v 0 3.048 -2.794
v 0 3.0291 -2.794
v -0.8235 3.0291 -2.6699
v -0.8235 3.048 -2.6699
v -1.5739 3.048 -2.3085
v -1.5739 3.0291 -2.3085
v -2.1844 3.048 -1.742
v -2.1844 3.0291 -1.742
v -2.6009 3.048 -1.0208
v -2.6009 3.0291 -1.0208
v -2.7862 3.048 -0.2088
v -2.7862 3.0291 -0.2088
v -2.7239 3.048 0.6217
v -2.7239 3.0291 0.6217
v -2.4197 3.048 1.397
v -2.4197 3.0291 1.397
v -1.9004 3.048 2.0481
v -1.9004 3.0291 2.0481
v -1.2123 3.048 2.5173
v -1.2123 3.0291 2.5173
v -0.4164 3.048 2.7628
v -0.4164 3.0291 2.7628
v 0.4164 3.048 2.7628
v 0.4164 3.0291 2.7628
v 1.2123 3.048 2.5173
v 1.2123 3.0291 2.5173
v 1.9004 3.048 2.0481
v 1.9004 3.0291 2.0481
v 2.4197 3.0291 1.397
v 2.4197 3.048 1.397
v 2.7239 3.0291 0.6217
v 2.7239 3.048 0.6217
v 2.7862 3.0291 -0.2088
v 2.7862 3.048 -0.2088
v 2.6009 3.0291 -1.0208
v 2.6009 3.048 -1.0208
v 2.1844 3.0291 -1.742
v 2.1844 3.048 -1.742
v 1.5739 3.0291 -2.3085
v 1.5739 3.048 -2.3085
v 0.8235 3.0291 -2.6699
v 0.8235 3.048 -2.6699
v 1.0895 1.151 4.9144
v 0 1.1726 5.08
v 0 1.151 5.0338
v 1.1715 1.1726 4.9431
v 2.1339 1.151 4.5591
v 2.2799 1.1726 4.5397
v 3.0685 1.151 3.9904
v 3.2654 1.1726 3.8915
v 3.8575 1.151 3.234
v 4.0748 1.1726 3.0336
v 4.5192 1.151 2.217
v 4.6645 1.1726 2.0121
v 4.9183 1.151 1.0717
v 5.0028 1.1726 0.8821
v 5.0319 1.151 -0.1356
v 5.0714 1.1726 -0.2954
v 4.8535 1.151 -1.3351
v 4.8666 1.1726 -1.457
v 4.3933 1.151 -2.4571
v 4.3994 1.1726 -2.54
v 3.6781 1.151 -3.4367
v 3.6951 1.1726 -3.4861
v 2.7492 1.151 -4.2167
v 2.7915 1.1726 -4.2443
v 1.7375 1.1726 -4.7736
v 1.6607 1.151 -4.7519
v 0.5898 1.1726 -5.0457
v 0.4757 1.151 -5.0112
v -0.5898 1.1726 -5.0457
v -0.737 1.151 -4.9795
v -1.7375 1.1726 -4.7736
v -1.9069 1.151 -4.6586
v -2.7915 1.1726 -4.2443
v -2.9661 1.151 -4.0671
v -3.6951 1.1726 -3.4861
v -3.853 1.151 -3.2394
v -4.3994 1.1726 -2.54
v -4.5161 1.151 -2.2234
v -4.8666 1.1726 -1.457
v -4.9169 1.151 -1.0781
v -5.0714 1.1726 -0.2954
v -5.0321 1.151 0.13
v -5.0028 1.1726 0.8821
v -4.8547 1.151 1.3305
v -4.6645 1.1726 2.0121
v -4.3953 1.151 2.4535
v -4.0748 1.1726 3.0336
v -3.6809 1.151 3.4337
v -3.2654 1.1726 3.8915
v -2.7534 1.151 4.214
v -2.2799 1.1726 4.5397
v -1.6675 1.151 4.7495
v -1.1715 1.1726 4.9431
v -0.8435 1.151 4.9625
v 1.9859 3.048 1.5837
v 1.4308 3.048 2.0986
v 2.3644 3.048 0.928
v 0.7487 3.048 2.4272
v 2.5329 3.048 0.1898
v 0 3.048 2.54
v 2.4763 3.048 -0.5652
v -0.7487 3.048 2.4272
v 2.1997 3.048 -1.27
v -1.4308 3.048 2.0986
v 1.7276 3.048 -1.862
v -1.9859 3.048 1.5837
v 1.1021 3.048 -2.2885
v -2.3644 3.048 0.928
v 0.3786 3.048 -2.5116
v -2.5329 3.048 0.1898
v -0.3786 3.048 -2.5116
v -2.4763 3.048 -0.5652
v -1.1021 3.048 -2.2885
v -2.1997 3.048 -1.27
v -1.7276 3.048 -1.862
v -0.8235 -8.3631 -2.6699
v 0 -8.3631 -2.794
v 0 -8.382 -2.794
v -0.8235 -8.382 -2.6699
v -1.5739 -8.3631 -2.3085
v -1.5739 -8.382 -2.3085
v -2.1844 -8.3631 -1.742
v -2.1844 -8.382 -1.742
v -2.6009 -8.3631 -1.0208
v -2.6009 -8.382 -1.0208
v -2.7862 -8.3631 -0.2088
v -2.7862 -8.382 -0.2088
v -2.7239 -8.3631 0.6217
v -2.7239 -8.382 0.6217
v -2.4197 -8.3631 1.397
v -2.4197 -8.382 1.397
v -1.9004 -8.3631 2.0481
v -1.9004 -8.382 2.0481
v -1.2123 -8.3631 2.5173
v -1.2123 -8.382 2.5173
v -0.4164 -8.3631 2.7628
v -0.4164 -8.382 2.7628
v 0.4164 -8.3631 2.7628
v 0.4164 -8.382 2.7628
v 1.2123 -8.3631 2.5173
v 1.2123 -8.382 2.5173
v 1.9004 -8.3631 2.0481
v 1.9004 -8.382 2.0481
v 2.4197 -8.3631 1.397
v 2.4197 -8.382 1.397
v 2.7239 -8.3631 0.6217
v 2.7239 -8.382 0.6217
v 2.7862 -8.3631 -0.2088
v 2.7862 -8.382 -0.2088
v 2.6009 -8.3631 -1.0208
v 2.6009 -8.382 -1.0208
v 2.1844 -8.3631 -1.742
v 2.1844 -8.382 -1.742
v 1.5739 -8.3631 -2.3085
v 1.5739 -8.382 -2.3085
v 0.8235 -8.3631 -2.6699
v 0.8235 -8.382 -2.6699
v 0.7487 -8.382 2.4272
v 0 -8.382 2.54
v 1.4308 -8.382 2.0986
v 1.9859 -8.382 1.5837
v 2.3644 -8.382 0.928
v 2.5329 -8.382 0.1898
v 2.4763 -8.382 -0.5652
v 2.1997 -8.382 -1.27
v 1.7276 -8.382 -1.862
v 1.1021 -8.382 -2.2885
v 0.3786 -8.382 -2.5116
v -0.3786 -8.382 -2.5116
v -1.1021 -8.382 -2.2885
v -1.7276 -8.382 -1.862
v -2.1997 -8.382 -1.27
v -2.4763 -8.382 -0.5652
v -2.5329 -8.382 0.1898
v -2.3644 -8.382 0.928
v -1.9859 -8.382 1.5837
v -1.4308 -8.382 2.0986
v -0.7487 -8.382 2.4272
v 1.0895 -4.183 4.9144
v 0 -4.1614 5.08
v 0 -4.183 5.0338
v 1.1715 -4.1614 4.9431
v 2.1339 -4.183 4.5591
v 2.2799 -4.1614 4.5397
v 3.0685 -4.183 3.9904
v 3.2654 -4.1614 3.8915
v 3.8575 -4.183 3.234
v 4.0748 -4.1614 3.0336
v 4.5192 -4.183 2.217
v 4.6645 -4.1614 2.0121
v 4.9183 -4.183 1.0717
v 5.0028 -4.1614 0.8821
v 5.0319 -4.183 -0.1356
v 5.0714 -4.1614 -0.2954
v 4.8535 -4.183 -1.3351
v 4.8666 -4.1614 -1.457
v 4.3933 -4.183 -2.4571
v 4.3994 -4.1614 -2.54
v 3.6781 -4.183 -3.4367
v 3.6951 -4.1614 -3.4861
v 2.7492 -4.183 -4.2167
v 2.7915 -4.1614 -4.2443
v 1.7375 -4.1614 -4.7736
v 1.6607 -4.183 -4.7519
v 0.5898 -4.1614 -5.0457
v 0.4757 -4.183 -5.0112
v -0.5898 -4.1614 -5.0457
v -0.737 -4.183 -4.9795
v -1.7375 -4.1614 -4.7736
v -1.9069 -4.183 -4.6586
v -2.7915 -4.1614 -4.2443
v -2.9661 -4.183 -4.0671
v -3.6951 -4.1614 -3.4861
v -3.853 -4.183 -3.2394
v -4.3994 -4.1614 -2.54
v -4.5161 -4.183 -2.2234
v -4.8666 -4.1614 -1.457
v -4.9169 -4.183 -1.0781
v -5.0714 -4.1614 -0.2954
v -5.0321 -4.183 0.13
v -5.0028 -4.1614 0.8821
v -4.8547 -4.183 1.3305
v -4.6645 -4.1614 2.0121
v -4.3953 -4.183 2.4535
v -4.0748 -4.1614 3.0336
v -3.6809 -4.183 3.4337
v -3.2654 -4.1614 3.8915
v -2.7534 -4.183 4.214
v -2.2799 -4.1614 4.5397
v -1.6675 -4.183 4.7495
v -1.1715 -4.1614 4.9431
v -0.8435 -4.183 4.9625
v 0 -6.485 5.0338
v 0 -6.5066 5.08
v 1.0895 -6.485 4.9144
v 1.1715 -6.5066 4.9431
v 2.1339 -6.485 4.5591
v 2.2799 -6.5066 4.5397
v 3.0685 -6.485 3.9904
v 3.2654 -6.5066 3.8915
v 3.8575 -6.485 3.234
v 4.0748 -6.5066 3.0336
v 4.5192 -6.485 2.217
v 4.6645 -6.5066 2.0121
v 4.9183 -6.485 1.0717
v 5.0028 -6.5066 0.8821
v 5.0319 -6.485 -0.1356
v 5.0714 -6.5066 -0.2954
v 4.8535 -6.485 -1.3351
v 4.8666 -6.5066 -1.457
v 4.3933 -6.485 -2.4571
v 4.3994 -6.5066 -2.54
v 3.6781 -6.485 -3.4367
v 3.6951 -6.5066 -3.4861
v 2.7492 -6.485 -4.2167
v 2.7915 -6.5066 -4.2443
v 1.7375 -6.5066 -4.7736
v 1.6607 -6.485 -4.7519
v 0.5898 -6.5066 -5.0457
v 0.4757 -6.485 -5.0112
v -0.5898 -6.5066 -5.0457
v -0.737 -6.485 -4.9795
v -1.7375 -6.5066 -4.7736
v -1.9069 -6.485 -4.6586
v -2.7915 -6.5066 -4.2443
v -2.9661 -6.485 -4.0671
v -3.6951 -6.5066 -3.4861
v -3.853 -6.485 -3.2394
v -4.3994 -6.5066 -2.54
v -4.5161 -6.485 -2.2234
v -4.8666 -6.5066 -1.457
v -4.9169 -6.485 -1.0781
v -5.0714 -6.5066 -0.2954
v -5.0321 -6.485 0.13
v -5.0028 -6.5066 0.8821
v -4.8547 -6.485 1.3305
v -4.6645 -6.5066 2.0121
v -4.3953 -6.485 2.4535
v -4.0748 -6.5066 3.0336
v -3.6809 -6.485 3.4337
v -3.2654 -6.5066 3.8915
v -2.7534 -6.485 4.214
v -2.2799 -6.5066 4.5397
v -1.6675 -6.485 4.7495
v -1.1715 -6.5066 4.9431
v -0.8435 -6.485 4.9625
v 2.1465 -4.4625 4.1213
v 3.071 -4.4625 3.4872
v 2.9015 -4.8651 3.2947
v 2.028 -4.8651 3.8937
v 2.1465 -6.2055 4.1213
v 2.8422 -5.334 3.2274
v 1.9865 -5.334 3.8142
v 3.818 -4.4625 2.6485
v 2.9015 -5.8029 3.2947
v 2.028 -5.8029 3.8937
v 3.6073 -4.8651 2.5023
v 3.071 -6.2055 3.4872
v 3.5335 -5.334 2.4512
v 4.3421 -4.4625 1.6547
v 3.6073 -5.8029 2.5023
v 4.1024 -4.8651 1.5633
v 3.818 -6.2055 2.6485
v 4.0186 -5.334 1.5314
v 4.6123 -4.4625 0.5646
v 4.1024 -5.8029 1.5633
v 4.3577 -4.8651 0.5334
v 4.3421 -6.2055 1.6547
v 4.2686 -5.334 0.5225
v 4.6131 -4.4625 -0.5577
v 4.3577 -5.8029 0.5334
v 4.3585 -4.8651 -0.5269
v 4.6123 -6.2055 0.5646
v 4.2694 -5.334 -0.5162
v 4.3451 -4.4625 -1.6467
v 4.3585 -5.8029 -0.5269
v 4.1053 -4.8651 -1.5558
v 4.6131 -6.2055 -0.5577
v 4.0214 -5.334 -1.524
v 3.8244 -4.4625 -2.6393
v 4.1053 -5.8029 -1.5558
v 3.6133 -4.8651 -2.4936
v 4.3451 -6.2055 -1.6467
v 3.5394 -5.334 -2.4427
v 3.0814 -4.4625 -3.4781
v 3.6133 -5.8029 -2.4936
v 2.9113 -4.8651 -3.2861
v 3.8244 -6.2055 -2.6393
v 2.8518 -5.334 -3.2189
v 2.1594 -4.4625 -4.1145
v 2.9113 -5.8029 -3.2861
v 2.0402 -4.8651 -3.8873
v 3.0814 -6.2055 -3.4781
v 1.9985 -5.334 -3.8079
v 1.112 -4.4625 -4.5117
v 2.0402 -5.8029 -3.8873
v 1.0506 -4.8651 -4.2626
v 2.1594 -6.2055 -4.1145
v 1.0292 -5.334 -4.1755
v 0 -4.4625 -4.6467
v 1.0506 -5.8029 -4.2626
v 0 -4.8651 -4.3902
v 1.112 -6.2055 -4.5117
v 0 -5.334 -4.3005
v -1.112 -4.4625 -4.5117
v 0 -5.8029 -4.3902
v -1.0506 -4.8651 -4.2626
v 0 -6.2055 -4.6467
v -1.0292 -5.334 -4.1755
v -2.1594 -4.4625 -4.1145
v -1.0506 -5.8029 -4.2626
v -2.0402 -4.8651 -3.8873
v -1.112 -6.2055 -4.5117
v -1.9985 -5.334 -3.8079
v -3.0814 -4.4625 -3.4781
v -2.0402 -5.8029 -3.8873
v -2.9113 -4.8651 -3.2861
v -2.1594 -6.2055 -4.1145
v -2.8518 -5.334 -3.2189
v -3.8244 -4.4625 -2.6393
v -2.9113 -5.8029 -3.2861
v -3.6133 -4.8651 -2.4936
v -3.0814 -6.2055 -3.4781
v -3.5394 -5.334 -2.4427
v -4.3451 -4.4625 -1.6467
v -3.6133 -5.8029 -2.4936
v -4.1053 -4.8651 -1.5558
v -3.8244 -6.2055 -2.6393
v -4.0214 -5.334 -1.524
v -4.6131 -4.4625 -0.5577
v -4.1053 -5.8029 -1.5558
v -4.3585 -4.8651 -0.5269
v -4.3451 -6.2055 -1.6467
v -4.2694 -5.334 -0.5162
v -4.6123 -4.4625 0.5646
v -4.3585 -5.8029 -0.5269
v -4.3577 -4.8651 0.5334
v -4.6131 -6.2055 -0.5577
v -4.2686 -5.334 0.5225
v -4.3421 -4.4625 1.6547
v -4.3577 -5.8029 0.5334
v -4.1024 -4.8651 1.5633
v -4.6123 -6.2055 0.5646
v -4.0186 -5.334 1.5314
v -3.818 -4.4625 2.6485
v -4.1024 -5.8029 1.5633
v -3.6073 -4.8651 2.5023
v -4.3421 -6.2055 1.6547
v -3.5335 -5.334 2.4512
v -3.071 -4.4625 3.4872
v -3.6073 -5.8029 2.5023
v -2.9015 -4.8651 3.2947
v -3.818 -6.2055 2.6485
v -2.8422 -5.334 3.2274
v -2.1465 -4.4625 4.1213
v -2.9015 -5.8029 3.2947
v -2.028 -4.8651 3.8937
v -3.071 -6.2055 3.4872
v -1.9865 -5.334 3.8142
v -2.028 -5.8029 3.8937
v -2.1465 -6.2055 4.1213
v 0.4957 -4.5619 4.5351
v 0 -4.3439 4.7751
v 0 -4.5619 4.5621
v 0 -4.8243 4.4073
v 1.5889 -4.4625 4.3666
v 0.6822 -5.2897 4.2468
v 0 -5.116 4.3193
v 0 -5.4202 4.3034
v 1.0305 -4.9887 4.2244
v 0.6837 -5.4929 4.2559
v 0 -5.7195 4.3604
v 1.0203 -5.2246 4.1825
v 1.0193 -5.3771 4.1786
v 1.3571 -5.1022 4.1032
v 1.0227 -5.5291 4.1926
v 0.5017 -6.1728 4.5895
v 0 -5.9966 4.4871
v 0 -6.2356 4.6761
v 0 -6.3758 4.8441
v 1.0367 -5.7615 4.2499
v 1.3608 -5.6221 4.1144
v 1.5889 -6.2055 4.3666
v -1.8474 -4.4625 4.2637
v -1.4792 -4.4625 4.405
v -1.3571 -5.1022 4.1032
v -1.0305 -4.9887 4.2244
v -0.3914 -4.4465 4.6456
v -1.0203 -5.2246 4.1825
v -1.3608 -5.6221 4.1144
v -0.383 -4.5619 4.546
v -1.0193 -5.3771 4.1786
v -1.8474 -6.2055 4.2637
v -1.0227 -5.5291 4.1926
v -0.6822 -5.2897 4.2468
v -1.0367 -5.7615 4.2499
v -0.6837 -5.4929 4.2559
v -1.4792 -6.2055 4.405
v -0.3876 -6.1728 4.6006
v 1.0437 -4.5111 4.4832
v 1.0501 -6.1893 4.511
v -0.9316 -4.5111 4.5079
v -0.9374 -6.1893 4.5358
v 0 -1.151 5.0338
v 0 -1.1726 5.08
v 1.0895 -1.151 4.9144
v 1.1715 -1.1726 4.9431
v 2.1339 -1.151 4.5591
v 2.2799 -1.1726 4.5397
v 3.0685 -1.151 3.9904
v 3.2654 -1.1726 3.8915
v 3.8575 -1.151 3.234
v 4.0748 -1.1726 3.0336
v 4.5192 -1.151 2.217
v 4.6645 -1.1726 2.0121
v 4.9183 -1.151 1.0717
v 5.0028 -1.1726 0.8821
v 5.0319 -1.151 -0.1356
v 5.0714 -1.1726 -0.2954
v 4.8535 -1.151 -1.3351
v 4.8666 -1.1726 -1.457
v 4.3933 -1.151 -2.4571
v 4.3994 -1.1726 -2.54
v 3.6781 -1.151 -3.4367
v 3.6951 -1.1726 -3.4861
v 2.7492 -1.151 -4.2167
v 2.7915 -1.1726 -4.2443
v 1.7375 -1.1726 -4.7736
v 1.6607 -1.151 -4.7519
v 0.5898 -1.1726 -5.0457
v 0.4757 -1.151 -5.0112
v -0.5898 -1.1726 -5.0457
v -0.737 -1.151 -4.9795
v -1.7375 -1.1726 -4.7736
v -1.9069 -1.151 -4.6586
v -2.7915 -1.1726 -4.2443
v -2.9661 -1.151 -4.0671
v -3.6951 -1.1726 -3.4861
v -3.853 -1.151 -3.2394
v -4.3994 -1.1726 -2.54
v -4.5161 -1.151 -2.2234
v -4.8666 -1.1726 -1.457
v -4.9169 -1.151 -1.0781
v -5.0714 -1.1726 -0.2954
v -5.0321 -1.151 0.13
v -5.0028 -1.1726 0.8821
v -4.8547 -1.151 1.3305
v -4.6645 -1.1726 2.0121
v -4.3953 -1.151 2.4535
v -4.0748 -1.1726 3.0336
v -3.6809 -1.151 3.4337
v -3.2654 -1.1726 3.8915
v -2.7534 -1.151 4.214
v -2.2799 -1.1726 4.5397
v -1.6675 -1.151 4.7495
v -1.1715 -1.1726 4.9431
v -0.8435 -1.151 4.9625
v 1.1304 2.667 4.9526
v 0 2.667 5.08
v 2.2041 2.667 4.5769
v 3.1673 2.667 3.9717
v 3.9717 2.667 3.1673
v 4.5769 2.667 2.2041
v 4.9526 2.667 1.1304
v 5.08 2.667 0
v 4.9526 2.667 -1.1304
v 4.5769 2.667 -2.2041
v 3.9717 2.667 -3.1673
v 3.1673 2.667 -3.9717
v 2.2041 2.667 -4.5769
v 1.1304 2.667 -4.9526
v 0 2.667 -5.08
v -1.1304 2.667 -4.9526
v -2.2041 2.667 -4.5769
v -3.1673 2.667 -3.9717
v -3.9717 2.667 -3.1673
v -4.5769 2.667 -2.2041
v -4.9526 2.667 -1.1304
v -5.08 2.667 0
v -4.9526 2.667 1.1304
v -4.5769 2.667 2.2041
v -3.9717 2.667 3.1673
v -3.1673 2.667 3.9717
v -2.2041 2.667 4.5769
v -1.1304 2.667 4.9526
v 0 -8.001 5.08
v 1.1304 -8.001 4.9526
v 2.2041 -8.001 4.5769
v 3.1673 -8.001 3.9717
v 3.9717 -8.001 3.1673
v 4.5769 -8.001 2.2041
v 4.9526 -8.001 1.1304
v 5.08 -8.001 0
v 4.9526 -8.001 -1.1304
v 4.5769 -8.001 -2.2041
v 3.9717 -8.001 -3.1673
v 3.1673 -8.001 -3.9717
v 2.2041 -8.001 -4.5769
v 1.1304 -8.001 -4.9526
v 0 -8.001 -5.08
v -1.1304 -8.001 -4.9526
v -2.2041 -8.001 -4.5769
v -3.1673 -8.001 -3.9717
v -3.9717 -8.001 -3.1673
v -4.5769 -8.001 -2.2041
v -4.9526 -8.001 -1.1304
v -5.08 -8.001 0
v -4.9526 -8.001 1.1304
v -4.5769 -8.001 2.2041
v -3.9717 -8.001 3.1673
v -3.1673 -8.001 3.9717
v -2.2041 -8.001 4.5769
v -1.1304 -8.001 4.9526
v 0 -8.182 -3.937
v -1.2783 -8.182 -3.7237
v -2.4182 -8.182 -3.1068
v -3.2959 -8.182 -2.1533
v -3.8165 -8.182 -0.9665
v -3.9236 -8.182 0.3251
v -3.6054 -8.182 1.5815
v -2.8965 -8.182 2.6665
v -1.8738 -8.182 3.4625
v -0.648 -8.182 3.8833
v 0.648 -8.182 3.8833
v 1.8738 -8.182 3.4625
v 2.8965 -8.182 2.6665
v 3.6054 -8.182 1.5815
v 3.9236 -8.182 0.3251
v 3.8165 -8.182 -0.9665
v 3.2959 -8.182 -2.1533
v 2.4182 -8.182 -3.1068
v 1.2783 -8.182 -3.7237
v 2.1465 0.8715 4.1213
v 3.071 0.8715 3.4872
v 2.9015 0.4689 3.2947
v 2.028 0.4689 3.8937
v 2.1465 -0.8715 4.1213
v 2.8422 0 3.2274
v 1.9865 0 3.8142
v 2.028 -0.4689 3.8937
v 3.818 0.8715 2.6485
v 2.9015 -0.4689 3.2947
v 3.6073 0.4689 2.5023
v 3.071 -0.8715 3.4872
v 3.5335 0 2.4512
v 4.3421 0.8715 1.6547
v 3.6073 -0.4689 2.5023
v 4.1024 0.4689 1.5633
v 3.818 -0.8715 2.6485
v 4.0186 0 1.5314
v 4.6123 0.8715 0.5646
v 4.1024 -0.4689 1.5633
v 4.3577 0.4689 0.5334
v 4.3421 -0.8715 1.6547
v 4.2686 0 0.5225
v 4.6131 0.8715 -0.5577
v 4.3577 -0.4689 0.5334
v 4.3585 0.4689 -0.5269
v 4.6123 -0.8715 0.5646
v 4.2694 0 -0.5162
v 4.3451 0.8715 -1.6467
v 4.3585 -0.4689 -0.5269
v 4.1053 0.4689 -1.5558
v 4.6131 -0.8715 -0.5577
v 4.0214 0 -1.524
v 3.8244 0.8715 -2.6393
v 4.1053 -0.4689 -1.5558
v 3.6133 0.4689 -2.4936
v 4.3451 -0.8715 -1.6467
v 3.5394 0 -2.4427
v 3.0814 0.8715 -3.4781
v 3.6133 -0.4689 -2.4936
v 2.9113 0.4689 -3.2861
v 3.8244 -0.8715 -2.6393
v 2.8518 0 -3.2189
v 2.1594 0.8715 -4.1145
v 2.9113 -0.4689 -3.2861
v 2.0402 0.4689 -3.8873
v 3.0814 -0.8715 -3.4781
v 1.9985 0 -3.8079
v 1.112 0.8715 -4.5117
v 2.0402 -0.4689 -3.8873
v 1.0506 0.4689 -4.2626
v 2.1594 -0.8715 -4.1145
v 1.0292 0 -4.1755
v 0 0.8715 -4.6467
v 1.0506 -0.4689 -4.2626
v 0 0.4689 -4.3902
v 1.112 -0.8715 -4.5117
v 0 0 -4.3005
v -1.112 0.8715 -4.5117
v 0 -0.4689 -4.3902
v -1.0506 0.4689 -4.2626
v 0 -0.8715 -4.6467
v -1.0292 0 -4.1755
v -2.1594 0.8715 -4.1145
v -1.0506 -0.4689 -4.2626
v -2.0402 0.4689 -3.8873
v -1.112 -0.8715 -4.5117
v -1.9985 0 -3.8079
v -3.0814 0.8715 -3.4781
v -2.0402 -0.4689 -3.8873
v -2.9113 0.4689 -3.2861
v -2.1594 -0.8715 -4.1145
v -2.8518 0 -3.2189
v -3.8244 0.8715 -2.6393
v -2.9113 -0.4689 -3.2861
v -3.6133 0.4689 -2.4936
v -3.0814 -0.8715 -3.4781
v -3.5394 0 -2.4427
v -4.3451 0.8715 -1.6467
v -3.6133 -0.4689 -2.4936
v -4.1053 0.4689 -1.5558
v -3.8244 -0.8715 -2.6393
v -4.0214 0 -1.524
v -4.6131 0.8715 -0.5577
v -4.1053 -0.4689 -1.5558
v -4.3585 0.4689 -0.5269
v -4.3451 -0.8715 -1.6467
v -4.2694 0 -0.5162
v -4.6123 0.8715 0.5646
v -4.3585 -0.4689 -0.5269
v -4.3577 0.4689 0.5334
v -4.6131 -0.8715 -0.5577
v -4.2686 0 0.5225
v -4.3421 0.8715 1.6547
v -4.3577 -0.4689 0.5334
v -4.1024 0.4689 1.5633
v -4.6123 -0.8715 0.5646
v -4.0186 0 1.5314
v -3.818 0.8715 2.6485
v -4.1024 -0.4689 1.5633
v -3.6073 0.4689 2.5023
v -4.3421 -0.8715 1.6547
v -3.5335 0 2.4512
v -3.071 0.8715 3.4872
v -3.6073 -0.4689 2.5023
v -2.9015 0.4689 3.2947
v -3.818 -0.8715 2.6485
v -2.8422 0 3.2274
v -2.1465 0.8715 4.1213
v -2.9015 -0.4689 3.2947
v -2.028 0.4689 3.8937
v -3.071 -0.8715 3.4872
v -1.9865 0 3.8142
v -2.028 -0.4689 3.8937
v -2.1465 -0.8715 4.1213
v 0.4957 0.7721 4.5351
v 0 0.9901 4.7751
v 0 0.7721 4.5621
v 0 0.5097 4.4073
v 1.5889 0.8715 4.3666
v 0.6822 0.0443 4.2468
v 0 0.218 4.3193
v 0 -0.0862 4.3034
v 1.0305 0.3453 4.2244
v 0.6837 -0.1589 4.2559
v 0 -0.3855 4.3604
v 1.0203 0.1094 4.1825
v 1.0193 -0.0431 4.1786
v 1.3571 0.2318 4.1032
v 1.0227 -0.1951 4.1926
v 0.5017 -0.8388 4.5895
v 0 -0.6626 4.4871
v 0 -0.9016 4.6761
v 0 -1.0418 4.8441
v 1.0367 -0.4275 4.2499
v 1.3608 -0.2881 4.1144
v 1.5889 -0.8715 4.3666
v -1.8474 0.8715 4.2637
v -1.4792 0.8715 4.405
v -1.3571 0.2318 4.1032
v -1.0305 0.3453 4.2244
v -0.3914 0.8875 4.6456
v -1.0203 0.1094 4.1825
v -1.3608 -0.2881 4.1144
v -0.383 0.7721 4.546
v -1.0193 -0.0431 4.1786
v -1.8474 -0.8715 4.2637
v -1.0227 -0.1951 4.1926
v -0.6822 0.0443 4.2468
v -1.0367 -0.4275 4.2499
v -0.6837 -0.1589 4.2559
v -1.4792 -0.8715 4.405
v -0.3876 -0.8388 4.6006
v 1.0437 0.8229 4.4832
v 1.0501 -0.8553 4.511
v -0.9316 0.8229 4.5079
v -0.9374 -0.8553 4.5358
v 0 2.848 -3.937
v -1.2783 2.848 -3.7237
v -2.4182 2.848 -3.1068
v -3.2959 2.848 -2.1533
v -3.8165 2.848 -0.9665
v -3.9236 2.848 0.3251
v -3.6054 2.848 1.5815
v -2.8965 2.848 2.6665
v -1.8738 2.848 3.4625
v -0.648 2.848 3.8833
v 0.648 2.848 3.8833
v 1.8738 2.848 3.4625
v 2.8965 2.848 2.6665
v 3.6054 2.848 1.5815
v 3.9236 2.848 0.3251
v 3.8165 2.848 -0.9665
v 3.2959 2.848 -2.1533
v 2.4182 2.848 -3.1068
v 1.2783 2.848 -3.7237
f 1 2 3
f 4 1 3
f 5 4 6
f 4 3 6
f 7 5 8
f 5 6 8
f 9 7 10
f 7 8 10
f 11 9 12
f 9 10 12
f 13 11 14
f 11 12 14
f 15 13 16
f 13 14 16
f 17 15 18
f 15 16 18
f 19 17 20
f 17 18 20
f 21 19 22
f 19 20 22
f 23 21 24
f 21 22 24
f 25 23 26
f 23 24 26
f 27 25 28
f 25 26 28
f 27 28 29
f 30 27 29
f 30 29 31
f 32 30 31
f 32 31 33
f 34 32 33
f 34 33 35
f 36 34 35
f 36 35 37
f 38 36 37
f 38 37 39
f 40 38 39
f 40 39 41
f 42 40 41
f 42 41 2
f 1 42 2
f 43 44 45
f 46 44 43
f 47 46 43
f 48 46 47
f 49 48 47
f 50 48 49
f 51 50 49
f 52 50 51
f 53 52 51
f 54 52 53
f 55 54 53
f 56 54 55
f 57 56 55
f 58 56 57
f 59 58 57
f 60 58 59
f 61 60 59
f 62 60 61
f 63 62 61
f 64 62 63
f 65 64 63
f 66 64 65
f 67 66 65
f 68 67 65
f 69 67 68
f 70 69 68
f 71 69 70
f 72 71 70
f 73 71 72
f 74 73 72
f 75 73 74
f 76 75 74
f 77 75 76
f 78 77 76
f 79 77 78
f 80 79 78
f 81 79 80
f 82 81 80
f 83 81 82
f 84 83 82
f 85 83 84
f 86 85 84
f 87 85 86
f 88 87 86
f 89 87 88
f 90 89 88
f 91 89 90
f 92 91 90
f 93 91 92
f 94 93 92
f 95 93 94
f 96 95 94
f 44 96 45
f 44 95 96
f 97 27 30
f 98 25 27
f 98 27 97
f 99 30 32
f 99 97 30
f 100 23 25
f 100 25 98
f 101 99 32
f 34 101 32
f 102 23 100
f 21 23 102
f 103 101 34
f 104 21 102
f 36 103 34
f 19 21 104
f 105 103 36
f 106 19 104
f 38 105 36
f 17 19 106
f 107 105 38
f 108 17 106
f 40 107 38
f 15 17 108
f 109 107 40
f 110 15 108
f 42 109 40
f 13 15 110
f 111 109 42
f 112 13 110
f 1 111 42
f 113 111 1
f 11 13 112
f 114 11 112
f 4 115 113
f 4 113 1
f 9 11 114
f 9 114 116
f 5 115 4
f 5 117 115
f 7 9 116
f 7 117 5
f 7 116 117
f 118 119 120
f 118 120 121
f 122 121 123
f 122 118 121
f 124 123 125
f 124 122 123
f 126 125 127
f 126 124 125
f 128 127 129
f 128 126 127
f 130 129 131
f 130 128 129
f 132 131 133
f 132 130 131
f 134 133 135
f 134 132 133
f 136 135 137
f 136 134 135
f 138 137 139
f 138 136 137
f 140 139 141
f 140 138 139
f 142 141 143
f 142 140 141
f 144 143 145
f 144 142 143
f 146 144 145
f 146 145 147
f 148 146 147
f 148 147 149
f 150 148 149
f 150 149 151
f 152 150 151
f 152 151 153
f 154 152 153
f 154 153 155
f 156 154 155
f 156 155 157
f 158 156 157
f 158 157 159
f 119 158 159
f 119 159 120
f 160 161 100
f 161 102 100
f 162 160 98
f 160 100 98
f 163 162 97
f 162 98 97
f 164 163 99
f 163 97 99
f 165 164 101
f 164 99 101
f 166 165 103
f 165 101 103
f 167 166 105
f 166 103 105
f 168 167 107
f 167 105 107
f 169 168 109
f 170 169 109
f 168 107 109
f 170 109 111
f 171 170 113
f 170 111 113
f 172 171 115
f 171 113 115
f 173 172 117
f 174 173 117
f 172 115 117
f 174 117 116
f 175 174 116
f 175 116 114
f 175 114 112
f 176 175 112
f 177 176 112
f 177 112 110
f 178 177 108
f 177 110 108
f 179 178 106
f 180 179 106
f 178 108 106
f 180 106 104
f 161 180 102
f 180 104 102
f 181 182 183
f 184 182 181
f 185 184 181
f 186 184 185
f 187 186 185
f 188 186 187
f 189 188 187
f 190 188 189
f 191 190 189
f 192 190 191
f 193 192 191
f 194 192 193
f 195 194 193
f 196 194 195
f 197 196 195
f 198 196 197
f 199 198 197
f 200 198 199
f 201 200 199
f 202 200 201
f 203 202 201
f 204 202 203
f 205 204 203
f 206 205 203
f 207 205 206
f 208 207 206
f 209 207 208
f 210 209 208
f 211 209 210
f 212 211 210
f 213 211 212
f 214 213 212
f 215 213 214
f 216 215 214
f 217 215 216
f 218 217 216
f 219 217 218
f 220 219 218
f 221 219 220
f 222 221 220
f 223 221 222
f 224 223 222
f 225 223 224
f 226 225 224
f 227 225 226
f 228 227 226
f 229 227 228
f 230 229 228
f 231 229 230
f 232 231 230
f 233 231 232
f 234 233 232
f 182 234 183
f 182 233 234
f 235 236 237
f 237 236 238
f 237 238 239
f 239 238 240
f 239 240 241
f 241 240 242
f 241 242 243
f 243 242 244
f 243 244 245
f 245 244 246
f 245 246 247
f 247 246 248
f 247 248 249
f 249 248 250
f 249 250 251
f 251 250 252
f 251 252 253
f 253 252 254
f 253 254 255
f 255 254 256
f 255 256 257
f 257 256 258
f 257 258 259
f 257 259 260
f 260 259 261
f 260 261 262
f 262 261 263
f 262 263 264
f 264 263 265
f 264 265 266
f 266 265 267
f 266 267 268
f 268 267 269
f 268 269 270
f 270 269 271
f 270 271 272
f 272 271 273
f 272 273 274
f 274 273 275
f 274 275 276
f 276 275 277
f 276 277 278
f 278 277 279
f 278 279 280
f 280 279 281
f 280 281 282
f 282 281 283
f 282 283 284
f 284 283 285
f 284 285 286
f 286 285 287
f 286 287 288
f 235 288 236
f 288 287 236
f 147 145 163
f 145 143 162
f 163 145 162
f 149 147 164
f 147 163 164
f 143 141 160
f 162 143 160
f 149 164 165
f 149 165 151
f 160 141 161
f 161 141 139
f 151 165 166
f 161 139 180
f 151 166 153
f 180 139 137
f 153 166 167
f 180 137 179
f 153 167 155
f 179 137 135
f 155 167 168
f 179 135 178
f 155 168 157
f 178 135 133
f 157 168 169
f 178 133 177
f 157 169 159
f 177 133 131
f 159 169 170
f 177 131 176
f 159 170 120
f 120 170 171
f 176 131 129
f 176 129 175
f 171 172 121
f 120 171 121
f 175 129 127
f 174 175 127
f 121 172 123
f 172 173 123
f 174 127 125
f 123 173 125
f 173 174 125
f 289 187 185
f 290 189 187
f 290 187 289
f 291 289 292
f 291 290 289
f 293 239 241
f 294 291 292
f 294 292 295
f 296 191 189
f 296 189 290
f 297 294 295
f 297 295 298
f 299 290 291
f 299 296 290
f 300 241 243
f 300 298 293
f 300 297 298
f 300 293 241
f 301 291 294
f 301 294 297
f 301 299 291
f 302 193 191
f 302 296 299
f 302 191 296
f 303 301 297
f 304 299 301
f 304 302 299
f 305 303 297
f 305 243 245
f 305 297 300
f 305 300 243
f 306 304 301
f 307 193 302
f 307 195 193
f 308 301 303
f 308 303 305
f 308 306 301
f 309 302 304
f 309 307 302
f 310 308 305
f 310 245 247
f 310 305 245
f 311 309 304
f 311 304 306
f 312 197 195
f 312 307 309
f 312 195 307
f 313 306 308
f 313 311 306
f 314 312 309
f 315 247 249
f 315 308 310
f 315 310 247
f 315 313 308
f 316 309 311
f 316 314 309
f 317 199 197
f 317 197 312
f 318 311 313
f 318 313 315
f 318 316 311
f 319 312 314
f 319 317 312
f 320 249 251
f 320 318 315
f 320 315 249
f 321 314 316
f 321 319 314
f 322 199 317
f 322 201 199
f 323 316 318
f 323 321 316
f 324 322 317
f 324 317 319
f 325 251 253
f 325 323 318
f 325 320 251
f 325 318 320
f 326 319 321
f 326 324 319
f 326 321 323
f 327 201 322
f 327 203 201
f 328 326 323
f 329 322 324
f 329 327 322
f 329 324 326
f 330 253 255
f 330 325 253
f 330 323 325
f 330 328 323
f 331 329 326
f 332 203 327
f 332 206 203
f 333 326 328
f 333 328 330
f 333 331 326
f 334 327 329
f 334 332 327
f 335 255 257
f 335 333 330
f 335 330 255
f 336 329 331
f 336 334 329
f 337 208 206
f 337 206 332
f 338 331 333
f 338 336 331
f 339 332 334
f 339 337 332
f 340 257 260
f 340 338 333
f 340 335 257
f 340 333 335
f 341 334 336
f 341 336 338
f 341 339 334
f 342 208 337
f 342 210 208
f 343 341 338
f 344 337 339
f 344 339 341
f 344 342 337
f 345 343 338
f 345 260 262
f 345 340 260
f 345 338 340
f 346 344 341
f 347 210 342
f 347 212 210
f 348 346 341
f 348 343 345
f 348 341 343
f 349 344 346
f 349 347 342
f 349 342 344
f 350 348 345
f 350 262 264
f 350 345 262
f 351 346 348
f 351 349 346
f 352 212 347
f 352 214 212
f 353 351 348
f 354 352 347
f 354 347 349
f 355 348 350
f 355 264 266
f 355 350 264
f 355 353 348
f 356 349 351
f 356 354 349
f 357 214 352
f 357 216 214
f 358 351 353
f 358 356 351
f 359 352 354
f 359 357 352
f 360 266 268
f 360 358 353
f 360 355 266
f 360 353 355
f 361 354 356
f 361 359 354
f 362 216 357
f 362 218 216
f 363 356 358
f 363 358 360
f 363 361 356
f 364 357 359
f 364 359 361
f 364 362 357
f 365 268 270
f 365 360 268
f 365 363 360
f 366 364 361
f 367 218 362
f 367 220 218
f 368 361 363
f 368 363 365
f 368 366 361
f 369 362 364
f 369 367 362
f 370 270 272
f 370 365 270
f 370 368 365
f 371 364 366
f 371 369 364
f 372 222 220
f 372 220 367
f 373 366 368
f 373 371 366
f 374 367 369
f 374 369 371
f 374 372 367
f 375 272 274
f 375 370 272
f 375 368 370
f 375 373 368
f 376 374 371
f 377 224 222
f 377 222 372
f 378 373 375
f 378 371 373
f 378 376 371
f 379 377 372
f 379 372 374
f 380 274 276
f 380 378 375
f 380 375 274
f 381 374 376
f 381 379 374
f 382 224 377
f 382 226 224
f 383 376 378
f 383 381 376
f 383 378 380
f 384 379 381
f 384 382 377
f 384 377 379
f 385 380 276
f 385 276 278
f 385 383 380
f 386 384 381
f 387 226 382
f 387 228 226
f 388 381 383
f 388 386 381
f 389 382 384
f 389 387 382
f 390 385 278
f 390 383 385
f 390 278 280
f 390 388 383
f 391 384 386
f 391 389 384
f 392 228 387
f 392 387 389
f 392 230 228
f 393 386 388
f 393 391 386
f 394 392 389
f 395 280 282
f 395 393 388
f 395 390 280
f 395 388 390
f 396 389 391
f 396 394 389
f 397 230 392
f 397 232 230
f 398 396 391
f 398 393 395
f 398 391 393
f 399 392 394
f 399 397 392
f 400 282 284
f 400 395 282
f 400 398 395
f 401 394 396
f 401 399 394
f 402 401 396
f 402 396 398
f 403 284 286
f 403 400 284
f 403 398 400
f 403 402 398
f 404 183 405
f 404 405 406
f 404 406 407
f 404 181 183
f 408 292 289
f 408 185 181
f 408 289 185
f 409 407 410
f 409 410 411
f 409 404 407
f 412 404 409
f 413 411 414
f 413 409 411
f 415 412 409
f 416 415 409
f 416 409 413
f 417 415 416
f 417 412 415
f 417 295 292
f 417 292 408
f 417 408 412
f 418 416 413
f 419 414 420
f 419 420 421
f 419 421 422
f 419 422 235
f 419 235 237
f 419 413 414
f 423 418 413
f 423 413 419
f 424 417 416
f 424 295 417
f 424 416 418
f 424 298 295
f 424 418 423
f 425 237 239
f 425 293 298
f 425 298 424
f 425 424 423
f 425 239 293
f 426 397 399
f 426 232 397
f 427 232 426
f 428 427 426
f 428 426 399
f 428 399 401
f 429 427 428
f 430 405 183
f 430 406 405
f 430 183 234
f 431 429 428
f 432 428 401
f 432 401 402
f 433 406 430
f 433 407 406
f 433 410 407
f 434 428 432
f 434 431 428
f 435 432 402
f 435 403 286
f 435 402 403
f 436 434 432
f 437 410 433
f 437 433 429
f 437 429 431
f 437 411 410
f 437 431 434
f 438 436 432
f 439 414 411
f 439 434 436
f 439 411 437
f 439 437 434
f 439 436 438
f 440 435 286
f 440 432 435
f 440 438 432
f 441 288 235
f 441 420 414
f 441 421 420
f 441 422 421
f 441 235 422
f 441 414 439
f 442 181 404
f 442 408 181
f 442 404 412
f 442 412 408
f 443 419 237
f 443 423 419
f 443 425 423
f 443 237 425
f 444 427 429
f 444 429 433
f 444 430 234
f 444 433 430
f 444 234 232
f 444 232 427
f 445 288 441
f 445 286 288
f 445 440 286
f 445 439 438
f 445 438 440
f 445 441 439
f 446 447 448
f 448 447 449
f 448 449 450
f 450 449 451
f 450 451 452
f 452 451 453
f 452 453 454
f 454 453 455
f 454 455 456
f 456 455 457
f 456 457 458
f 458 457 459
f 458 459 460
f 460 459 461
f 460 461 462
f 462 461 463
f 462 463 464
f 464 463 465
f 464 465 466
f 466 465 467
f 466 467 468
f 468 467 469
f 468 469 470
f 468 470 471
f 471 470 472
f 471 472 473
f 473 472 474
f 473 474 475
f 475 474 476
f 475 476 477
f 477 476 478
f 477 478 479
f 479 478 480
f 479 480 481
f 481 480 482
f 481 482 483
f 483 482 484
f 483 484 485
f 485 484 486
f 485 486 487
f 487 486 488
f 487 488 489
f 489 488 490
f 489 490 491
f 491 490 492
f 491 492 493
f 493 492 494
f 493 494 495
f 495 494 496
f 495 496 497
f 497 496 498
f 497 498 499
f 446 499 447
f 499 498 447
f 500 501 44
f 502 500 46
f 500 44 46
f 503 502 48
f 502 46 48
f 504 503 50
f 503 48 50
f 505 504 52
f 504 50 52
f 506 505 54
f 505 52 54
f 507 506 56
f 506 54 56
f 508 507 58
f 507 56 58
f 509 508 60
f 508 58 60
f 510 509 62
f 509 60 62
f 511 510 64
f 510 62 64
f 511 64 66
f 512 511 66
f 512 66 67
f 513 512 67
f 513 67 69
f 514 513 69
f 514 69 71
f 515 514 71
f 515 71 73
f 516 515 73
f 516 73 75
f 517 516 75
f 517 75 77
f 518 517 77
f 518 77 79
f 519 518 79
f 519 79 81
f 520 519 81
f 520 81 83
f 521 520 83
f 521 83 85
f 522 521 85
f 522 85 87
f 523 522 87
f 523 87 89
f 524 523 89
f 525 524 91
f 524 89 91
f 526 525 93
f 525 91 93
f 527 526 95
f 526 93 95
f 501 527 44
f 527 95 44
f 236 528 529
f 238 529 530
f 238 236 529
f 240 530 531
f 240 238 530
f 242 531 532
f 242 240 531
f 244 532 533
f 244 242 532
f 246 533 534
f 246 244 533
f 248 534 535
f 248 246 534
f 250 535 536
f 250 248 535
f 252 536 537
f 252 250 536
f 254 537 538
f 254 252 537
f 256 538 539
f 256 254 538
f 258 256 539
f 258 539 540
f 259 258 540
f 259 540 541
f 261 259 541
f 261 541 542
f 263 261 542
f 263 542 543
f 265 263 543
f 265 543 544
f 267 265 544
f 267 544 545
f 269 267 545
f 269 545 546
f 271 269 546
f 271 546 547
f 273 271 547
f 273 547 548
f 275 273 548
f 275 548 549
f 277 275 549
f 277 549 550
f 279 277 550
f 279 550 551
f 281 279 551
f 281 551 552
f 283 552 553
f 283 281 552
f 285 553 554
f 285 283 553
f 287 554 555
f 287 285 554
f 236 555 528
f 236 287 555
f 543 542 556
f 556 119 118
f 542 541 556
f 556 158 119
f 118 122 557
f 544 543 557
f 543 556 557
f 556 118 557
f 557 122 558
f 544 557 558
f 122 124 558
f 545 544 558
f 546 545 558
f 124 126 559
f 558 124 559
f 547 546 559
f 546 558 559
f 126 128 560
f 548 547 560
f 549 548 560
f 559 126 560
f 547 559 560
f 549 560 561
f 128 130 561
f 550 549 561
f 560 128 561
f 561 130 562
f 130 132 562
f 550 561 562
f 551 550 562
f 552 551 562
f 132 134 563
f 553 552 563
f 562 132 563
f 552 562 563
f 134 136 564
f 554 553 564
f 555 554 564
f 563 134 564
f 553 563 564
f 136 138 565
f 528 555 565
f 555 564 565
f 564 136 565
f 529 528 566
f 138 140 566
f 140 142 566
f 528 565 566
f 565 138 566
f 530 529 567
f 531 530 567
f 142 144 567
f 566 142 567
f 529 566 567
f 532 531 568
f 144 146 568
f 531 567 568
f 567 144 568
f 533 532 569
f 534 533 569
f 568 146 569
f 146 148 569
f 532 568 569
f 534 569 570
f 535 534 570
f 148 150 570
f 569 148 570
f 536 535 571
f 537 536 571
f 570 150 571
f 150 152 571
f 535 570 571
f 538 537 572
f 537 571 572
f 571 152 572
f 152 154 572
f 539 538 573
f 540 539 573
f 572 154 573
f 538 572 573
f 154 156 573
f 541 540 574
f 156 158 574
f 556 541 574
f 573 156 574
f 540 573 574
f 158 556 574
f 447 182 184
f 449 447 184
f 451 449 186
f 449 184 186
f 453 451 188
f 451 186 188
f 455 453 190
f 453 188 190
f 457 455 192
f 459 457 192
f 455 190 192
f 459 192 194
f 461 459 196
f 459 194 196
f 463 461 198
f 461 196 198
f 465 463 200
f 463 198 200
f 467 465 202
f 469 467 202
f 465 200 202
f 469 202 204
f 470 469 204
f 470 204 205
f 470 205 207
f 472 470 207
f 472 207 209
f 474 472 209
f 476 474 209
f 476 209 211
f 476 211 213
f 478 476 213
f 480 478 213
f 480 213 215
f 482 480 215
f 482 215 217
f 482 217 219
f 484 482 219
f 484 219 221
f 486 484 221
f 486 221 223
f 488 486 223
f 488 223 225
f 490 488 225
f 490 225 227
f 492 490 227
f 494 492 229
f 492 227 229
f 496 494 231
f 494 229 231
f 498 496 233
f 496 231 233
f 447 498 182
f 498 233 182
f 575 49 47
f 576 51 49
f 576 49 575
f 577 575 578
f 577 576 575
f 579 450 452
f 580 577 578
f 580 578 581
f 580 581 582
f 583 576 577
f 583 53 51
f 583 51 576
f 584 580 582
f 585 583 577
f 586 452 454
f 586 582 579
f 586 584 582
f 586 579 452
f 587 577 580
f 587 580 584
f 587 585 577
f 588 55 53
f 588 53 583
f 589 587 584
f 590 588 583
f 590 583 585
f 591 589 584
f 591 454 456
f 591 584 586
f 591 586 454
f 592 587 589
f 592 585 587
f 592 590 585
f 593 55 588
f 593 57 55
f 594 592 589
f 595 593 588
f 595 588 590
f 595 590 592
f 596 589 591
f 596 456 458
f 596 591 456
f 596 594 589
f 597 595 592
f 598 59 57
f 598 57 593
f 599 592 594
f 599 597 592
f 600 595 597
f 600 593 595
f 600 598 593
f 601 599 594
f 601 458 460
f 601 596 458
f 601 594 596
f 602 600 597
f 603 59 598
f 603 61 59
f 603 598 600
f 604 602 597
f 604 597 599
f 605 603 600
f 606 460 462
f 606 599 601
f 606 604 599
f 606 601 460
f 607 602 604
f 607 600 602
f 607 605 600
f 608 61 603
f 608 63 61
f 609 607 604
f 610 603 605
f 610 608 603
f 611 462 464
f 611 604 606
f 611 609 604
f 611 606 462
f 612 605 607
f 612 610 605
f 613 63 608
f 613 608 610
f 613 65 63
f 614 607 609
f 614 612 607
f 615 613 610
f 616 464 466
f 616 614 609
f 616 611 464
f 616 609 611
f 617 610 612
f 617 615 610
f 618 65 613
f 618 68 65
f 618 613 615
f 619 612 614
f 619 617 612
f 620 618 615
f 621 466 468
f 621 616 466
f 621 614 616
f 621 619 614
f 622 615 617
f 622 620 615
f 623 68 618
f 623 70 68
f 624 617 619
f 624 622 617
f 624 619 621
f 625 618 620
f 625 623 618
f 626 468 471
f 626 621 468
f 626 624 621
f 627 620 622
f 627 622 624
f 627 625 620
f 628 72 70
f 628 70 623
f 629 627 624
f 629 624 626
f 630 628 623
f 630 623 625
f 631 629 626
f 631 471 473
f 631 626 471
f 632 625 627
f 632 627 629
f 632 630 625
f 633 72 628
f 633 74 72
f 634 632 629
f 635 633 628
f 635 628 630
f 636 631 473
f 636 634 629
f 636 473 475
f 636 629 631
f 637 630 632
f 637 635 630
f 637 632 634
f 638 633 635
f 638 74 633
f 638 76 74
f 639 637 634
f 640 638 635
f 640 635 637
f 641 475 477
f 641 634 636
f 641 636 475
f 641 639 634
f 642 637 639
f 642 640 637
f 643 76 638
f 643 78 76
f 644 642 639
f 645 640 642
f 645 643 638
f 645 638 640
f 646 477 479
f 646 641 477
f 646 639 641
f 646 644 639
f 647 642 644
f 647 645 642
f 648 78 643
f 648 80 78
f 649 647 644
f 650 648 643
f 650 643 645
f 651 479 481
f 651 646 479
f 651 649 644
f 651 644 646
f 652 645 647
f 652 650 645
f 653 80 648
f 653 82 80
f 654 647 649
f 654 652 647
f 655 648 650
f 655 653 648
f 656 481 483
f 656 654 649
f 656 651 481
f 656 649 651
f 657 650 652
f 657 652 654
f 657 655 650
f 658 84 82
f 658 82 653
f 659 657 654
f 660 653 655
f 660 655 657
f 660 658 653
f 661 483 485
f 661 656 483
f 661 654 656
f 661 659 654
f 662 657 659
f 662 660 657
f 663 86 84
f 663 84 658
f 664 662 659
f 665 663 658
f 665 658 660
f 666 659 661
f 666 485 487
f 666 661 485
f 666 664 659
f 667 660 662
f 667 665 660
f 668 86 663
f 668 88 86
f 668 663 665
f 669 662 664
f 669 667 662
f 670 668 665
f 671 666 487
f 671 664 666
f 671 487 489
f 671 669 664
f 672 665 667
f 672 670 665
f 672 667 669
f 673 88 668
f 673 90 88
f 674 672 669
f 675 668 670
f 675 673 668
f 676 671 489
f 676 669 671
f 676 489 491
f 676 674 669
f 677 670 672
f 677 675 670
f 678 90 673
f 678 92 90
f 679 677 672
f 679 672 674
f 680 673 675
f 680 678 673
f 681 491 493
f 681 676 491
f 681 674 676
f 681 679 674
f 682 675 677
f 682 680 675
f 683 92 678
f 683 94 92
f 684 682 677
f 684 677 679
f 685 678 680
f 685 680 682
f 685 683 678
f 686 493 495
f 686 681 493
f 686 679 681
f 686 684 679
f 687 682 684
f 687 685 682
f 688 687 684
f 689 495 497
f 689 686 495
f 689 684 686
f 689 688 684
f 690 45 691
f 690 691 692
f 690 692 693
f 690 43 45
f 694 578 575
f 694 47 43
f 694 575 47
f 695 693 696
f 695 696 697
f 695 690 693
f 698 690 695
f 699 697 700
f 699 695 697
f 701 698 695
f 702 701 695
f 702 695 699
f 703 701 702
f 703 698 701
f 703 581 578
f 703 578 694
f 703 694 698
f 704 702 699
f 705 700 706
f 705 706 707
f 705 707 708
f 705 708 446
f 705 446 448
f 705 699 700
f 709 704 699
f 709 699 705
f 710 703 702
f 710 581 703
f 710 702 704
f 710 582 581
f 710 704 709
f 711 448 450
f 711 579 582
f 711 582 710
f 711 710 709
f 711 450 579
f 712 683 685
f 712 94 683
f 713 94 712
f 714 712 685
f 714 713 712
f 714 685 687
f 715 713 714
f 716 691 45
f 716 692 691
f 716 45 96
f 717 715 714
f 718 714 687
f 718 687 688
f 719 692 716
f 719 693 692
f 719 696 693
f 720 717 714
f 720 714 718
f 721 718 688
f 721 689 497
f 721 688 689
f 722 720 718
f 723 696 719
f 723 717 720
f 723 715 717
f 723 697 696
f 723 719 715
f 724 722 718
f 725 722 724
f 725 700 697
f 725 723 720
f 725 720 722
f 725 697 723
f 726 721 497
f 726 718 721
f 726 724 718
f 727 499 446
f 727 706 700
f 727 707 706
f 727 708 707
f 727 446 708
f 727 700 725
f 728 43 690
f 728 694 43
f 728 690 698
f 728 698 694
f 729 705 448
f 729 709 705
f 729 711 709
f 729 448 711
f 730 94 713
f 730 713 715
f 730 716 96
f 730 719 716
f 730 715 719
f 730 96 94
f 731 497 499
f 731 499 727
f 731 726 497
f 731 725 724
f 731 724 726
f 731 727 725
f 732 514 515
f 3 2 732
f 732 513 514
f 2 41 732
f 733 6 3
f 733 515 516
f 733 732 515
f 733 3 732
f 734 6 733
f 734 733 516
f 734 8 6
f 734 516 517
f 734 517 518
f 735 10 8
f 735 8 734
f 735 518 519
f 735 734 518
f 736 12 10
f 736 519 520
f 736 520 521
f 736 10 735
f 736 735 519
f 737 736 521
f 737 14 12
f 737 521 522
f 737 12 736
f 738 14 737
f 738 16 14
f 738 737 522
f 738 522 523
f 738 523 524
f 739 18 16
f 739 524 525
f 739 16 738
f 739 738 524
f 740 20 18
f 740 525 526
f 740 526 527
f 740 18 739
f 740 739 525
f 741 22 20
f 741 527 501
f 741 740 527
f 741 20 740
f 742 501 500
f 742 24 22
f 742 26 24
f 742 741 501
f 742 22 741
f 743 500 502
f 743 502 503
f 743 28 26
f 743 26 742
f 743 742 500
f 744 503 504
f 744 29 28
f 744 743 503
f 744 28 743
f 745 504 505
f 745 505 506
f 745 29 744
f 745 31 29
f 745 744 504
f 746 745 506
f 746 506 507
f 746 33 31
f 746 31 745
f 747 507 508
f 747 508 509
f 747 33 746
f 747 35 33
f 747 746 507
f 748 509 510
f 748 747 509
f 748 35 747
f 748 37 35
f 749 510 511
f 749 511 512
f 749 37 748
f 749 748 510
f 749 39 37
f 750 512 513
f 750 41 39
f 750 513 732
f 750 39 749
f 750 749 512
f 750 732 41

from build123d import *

# Parameters (mm, degrees)
SKETCH1_R           = 5.08
SKETCH1_R_2         = 2.54
BOSS_EXTRUDE1_DEPTH = 2.667
CHAMFER3_SIZE       = 2.5146
CHAMFER3_SIZE2      = 1.172577237
SKETCH3_R           = 2.794
SKETCH3_R_2         = 2.54
BOSS_EXTRUDE2_DEPTH = 0.381
CHAMFER1_SIZE       = 2.286
CHAMFER1_SIZE_2     = 0.362066831
FILLET4_R           = 1.27


with BuildPart() as part:
    # Sketch1 → Boss-Extrude1 (new body)
    with BuildSketch(Plane(origin=(0, 0, 0), x_dir=(1, 0, 0), z_dir=(0, 1, 0))):
        with Locations(Location((0, 0, 0), (0, 0, 270))):
            Circle(SKETCH1_R)
        with Locations(Location((0, 0, 0), (0, 0, 270))):
            Circle(SKETCH1_R_2, mode=Mode.SUBTRACT)
    extrude(amount=BOSS_EXTRUDE1_DEPTH)

    # Chamfer3
    chamfer3_edges = [part.edges().sort_by_distance(p)[0] for p in [
        (0, 0, -5.08),
    ]]
    chamfer3_side = [part.faces().sort_by_distance(p)[0] for p in [
        (0, 0, -4.936315902),
    ]]
    chamfer(chamfer3_edges, length=CHAMFER3_SIZE, length2=CHAMFER3_SIZE2, reference=chamfer3_side[0])

    # Mirror4: part across plane


with BuildPart() as part_1:
    add(part.part)
    add(part.part.mirror(Plane.ZX))

    # Sketch3 → Boss-Extrude2 (add)
    with BuildSketch(Plane(origin=(0, 2.667, 0), x_dir=(1, 0, 0), z_dir=(0, 1, 0))):
        with Locations(Location((0, 0, 0), (0, 0, 90))):
            Circle(SKETCH3_R)
        with Locations(Location((0, 0, 0), (0, 0, 270))):
            Circle(SKETCH3_R_2, mode=Mode.SUBTRACT)
    extrude(amount=BOSS_EXTRUDE2_DEPTH)

    # Chamfer1
    # the kernel refuses this chamfer: 2.286, 0.362066831 mm, written as the material it adds along each edge
    with BuildSketch(Plane(origin=(0, 2.667, 0), x_dir=(0, 0, -1), z_dir=(1, 0, 0))) as chamfer1_piece_1_section:
        Polygon((2.794 + CHAMFER1_SIZE, 0), (2.794, CHAMFER1_SIZE_2 * 0.999999998845), (2.794, 0), align=None)
    chamfer1_piece_1 = revolve(axis=Axis((0, 2.667, 0), (0, 1, 0)), mode=Mode.PRIVATE)
    chamfer1_piece_1 = chamfer1_piece_1 & Plane(origin=(0, 2.832338602, 0), x_dir=(0, 0, 1), z_dir=(0, -1, 0)) * Cylinder(5.08, 21, mode=Mode.PRIVATE)
    add(chamfer1_piece_1)

    # Mirror5: part across plane


with BuildPart() as part_2:
    add(part_1.part)
    add(part_1.part.mirror(Plane(origin=(0, -2.667, 0), x_dir=(0, 0, 1), z_dir=(0, -1, 0))))

    # Fillet4
    fillet4_edges = [part_2.edges().sort_by_distance(p)[0] for p in [
        (0, 0, -2.5654),
        (0, -5.334, -2.5654),
    ]]
    fillet(fillet4_edges, radius=FILLET4_R)


solid = part_2.part
